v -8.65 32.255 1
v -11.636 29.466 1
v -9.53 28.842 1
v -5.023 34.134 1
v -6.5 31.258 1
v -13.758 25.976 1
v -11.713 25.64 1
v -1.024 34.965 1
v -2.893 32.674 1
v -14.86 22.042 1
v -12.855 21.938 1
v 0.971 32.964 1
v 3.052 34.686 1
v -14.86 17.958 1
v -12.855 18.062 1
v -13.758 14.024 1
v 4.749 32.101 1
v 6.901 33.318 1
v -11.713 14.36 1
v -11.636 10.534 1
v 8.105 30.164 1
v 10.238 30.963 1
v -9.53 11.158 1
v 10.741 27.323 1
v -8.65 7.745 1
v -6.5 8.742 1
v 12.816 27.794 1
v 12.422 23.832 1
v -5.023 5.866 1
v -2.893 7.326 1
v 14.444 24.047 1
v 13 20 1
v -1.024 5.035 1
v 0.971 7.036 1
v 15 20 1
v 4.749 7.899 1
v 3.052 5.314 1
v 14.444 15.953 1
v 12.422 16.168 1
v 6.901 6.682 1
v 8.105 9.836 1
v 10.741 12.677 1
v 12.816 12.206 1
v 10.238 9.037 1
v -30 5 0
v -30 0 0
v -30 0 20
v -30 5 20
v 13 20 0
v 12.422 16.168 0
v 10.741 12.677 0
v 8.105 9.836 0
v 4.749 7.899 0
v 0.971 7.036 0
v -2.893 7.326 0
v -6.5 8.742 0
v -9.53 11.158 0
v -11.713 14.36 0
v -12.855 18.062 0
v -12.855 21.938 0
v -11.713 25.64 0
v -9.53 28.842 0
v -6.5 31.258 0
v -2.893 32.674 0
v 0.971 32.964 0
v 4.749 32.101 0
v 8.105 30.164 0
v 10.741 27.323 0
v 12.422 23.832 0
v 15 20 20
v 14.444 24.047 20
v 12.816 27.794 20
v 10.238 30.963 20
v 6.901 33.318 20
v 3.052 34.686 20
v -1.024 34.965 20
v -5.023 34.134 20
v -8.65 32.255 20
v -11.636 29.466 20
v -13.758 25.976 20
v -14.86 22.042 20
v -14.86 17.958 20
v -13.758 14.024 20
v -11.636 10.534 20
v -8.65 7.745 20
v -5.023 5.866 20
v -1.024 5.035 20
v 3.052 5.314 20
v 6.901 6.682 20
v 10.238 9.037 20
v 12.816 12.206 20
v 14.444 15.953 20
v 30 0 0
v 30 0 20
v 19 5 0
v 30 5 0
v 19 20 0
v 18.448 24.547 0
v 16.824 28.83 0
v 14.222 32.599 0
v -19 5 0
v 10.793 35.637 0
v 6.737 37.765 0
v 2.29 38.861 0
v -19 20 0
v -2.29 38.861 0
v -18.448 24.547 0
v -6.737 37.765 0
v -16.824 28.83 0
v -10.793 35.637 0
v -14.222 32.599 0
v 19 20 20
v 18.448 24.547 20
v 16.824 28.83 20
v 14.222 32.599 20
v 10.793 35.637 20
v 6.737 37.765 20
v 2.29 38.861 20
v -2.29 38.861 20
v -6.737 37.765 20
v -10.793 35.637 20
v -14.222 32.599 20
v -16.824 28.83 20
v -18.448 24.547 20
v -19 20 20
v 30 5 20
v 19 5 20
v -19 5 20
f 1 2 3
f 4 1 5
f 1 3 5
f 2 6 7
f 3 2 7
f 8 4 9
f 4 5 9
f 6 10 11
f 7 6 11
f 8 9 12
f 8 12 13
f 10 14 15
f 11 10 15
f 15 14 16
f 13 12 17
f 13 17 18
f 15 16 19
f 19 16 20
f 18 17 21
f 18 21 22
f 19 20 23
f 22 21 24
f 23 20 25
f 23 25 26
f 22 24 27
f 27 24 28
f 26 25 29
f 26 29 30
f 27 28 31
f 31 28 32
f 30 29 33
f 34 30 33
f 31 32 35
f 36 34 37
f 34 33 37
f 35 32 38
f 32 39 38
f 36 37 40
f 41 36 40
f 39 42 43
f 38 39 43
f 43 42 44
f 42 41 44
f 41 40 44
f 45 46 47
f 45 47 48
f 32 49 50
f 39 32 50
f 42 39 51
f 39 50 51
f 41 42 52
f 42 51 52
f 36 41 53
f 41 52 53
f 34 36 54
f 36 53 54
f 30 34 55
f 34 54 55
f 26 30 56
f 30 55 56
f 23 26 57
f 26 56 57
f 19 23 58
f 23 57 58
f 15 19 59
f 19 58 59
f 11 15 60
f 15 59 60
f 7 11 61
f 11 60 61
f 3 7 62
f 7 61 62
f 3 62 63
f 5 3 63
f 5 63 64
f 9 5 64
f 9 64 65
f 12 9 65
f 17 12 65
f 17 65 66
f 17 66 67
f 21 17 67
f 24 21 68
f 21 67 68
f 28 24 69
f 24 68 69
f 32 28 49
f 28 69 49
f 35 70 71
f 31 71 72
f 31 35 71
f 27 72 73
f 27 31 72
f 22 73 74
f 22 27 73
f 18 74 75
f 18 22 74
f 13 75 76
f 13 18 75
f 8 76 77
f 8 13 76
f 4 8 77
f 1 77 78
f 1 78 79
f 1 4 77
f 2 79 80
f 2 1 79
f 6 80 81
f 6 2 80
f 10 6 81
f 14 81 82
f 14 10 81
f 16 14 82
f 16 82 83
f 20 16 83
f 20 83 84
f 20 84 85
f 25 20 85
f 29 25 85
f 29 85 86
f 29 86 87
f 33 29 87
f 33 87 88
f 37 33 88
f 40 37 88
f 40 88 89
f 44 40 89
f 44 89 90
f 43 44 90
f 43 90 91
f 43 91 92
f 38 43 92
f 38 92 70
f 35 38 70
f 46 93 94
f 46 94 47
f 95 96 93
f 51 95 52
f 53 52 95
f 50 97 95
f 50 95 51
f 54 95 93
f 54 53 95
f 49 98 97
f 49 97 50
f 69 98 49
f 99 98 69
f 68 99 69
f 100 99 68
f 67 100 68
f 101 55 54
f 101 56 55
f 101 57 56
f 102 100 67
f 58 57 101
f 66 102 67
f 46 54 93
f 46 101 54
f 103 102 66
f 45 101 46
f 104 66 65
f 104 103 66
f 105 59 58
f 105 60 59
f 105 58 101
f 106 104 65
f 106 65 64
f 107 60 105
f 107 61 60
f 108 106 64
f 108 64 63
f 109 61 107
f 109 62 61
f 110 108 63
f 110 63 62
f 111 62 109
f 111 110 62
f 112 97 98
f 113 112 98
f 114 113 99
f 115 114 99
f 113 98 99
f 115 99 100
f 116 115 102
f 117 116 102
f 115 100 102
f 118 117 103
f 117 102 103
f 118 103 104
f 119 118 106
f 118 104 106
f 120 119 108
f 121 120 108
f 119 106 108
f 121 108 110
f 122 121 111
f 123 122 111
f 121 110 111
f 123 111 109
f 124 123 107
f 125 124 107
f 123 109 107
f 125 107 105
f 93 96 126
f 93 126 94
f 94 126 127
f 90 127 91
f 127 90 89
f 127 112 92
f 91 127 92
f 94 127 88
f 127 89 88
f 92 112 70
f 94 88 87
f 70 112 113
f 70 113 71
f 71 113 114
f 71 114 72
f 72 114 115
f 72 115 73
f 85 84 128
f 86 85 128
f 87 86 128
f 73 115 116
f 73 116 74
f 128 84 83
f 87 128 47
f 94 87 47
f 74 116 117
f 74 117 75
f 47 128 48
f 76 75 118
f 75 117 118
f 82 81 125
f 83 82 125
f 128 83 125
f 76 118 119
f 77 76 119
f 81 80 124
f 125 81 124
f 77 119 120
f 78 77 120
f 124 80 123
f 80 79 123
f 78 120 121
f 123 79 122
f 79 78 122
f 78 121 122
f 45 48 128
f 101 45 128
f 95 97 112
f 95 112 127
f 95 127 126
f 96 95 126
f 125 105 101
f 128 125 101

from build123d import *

# Parameters (mm, degrees)
SKETCH_R     = 15
PAD_DEPTH    = 20
SKETCH001_R  = 13
PAD001_DEPTH = 1


with BuildPart() as part:
    # Sketch → Pad (new body)
    with BuildSketch(Plane.XY):
        with BuildLine():
            Line((30, 5), (30, 0))
            Line((30, 0), (-30, 0))
            Line((-30, 0), (-30, 5))
            Line((-30, 5), (-19, 5))
            Line((-19, 20), (-19, 5))
            ThreePointArc((19, 20), (0, 39), (-19, 20))
            Line((19, 20), (19, 5))
            Line((19, 5), (30, 5))
        make_face()
        with Locations((0, 20)):
            Circle(SKETCH_R, mode=Mode.SUBTRACT)
    extrude(amount=PAD_DEPTH)

    # Sketch001 (on Face10 of Pad) → Pad001 (join)
    with BuildSketch(Plane(origin=(0, 0, 0), x_dir=(1, 0, 0), z_dir=(0, 0, -1))):
        with BuildLine():
            ThreePointArc((-19, -20), (0, -39), (19, -20))
            Line((19, -5), (19, -20))
            Line((30, -5), (19, -5))
            Line((30, 0), (30, -5))
            Line((-30, 0), (30, 0))
            Line((-30, -5), (-30, 0))
            Line((-19, -5), (-30, -5))
            Line((-19, -20), (-19, -5))
        make_face()
        with Locations((0, -20)):
            Circle(SKETCH001_R, mode=Mode.SUBTRACT)
    extrude(amount=-PAD001_DEPTH)


solid = part.part
